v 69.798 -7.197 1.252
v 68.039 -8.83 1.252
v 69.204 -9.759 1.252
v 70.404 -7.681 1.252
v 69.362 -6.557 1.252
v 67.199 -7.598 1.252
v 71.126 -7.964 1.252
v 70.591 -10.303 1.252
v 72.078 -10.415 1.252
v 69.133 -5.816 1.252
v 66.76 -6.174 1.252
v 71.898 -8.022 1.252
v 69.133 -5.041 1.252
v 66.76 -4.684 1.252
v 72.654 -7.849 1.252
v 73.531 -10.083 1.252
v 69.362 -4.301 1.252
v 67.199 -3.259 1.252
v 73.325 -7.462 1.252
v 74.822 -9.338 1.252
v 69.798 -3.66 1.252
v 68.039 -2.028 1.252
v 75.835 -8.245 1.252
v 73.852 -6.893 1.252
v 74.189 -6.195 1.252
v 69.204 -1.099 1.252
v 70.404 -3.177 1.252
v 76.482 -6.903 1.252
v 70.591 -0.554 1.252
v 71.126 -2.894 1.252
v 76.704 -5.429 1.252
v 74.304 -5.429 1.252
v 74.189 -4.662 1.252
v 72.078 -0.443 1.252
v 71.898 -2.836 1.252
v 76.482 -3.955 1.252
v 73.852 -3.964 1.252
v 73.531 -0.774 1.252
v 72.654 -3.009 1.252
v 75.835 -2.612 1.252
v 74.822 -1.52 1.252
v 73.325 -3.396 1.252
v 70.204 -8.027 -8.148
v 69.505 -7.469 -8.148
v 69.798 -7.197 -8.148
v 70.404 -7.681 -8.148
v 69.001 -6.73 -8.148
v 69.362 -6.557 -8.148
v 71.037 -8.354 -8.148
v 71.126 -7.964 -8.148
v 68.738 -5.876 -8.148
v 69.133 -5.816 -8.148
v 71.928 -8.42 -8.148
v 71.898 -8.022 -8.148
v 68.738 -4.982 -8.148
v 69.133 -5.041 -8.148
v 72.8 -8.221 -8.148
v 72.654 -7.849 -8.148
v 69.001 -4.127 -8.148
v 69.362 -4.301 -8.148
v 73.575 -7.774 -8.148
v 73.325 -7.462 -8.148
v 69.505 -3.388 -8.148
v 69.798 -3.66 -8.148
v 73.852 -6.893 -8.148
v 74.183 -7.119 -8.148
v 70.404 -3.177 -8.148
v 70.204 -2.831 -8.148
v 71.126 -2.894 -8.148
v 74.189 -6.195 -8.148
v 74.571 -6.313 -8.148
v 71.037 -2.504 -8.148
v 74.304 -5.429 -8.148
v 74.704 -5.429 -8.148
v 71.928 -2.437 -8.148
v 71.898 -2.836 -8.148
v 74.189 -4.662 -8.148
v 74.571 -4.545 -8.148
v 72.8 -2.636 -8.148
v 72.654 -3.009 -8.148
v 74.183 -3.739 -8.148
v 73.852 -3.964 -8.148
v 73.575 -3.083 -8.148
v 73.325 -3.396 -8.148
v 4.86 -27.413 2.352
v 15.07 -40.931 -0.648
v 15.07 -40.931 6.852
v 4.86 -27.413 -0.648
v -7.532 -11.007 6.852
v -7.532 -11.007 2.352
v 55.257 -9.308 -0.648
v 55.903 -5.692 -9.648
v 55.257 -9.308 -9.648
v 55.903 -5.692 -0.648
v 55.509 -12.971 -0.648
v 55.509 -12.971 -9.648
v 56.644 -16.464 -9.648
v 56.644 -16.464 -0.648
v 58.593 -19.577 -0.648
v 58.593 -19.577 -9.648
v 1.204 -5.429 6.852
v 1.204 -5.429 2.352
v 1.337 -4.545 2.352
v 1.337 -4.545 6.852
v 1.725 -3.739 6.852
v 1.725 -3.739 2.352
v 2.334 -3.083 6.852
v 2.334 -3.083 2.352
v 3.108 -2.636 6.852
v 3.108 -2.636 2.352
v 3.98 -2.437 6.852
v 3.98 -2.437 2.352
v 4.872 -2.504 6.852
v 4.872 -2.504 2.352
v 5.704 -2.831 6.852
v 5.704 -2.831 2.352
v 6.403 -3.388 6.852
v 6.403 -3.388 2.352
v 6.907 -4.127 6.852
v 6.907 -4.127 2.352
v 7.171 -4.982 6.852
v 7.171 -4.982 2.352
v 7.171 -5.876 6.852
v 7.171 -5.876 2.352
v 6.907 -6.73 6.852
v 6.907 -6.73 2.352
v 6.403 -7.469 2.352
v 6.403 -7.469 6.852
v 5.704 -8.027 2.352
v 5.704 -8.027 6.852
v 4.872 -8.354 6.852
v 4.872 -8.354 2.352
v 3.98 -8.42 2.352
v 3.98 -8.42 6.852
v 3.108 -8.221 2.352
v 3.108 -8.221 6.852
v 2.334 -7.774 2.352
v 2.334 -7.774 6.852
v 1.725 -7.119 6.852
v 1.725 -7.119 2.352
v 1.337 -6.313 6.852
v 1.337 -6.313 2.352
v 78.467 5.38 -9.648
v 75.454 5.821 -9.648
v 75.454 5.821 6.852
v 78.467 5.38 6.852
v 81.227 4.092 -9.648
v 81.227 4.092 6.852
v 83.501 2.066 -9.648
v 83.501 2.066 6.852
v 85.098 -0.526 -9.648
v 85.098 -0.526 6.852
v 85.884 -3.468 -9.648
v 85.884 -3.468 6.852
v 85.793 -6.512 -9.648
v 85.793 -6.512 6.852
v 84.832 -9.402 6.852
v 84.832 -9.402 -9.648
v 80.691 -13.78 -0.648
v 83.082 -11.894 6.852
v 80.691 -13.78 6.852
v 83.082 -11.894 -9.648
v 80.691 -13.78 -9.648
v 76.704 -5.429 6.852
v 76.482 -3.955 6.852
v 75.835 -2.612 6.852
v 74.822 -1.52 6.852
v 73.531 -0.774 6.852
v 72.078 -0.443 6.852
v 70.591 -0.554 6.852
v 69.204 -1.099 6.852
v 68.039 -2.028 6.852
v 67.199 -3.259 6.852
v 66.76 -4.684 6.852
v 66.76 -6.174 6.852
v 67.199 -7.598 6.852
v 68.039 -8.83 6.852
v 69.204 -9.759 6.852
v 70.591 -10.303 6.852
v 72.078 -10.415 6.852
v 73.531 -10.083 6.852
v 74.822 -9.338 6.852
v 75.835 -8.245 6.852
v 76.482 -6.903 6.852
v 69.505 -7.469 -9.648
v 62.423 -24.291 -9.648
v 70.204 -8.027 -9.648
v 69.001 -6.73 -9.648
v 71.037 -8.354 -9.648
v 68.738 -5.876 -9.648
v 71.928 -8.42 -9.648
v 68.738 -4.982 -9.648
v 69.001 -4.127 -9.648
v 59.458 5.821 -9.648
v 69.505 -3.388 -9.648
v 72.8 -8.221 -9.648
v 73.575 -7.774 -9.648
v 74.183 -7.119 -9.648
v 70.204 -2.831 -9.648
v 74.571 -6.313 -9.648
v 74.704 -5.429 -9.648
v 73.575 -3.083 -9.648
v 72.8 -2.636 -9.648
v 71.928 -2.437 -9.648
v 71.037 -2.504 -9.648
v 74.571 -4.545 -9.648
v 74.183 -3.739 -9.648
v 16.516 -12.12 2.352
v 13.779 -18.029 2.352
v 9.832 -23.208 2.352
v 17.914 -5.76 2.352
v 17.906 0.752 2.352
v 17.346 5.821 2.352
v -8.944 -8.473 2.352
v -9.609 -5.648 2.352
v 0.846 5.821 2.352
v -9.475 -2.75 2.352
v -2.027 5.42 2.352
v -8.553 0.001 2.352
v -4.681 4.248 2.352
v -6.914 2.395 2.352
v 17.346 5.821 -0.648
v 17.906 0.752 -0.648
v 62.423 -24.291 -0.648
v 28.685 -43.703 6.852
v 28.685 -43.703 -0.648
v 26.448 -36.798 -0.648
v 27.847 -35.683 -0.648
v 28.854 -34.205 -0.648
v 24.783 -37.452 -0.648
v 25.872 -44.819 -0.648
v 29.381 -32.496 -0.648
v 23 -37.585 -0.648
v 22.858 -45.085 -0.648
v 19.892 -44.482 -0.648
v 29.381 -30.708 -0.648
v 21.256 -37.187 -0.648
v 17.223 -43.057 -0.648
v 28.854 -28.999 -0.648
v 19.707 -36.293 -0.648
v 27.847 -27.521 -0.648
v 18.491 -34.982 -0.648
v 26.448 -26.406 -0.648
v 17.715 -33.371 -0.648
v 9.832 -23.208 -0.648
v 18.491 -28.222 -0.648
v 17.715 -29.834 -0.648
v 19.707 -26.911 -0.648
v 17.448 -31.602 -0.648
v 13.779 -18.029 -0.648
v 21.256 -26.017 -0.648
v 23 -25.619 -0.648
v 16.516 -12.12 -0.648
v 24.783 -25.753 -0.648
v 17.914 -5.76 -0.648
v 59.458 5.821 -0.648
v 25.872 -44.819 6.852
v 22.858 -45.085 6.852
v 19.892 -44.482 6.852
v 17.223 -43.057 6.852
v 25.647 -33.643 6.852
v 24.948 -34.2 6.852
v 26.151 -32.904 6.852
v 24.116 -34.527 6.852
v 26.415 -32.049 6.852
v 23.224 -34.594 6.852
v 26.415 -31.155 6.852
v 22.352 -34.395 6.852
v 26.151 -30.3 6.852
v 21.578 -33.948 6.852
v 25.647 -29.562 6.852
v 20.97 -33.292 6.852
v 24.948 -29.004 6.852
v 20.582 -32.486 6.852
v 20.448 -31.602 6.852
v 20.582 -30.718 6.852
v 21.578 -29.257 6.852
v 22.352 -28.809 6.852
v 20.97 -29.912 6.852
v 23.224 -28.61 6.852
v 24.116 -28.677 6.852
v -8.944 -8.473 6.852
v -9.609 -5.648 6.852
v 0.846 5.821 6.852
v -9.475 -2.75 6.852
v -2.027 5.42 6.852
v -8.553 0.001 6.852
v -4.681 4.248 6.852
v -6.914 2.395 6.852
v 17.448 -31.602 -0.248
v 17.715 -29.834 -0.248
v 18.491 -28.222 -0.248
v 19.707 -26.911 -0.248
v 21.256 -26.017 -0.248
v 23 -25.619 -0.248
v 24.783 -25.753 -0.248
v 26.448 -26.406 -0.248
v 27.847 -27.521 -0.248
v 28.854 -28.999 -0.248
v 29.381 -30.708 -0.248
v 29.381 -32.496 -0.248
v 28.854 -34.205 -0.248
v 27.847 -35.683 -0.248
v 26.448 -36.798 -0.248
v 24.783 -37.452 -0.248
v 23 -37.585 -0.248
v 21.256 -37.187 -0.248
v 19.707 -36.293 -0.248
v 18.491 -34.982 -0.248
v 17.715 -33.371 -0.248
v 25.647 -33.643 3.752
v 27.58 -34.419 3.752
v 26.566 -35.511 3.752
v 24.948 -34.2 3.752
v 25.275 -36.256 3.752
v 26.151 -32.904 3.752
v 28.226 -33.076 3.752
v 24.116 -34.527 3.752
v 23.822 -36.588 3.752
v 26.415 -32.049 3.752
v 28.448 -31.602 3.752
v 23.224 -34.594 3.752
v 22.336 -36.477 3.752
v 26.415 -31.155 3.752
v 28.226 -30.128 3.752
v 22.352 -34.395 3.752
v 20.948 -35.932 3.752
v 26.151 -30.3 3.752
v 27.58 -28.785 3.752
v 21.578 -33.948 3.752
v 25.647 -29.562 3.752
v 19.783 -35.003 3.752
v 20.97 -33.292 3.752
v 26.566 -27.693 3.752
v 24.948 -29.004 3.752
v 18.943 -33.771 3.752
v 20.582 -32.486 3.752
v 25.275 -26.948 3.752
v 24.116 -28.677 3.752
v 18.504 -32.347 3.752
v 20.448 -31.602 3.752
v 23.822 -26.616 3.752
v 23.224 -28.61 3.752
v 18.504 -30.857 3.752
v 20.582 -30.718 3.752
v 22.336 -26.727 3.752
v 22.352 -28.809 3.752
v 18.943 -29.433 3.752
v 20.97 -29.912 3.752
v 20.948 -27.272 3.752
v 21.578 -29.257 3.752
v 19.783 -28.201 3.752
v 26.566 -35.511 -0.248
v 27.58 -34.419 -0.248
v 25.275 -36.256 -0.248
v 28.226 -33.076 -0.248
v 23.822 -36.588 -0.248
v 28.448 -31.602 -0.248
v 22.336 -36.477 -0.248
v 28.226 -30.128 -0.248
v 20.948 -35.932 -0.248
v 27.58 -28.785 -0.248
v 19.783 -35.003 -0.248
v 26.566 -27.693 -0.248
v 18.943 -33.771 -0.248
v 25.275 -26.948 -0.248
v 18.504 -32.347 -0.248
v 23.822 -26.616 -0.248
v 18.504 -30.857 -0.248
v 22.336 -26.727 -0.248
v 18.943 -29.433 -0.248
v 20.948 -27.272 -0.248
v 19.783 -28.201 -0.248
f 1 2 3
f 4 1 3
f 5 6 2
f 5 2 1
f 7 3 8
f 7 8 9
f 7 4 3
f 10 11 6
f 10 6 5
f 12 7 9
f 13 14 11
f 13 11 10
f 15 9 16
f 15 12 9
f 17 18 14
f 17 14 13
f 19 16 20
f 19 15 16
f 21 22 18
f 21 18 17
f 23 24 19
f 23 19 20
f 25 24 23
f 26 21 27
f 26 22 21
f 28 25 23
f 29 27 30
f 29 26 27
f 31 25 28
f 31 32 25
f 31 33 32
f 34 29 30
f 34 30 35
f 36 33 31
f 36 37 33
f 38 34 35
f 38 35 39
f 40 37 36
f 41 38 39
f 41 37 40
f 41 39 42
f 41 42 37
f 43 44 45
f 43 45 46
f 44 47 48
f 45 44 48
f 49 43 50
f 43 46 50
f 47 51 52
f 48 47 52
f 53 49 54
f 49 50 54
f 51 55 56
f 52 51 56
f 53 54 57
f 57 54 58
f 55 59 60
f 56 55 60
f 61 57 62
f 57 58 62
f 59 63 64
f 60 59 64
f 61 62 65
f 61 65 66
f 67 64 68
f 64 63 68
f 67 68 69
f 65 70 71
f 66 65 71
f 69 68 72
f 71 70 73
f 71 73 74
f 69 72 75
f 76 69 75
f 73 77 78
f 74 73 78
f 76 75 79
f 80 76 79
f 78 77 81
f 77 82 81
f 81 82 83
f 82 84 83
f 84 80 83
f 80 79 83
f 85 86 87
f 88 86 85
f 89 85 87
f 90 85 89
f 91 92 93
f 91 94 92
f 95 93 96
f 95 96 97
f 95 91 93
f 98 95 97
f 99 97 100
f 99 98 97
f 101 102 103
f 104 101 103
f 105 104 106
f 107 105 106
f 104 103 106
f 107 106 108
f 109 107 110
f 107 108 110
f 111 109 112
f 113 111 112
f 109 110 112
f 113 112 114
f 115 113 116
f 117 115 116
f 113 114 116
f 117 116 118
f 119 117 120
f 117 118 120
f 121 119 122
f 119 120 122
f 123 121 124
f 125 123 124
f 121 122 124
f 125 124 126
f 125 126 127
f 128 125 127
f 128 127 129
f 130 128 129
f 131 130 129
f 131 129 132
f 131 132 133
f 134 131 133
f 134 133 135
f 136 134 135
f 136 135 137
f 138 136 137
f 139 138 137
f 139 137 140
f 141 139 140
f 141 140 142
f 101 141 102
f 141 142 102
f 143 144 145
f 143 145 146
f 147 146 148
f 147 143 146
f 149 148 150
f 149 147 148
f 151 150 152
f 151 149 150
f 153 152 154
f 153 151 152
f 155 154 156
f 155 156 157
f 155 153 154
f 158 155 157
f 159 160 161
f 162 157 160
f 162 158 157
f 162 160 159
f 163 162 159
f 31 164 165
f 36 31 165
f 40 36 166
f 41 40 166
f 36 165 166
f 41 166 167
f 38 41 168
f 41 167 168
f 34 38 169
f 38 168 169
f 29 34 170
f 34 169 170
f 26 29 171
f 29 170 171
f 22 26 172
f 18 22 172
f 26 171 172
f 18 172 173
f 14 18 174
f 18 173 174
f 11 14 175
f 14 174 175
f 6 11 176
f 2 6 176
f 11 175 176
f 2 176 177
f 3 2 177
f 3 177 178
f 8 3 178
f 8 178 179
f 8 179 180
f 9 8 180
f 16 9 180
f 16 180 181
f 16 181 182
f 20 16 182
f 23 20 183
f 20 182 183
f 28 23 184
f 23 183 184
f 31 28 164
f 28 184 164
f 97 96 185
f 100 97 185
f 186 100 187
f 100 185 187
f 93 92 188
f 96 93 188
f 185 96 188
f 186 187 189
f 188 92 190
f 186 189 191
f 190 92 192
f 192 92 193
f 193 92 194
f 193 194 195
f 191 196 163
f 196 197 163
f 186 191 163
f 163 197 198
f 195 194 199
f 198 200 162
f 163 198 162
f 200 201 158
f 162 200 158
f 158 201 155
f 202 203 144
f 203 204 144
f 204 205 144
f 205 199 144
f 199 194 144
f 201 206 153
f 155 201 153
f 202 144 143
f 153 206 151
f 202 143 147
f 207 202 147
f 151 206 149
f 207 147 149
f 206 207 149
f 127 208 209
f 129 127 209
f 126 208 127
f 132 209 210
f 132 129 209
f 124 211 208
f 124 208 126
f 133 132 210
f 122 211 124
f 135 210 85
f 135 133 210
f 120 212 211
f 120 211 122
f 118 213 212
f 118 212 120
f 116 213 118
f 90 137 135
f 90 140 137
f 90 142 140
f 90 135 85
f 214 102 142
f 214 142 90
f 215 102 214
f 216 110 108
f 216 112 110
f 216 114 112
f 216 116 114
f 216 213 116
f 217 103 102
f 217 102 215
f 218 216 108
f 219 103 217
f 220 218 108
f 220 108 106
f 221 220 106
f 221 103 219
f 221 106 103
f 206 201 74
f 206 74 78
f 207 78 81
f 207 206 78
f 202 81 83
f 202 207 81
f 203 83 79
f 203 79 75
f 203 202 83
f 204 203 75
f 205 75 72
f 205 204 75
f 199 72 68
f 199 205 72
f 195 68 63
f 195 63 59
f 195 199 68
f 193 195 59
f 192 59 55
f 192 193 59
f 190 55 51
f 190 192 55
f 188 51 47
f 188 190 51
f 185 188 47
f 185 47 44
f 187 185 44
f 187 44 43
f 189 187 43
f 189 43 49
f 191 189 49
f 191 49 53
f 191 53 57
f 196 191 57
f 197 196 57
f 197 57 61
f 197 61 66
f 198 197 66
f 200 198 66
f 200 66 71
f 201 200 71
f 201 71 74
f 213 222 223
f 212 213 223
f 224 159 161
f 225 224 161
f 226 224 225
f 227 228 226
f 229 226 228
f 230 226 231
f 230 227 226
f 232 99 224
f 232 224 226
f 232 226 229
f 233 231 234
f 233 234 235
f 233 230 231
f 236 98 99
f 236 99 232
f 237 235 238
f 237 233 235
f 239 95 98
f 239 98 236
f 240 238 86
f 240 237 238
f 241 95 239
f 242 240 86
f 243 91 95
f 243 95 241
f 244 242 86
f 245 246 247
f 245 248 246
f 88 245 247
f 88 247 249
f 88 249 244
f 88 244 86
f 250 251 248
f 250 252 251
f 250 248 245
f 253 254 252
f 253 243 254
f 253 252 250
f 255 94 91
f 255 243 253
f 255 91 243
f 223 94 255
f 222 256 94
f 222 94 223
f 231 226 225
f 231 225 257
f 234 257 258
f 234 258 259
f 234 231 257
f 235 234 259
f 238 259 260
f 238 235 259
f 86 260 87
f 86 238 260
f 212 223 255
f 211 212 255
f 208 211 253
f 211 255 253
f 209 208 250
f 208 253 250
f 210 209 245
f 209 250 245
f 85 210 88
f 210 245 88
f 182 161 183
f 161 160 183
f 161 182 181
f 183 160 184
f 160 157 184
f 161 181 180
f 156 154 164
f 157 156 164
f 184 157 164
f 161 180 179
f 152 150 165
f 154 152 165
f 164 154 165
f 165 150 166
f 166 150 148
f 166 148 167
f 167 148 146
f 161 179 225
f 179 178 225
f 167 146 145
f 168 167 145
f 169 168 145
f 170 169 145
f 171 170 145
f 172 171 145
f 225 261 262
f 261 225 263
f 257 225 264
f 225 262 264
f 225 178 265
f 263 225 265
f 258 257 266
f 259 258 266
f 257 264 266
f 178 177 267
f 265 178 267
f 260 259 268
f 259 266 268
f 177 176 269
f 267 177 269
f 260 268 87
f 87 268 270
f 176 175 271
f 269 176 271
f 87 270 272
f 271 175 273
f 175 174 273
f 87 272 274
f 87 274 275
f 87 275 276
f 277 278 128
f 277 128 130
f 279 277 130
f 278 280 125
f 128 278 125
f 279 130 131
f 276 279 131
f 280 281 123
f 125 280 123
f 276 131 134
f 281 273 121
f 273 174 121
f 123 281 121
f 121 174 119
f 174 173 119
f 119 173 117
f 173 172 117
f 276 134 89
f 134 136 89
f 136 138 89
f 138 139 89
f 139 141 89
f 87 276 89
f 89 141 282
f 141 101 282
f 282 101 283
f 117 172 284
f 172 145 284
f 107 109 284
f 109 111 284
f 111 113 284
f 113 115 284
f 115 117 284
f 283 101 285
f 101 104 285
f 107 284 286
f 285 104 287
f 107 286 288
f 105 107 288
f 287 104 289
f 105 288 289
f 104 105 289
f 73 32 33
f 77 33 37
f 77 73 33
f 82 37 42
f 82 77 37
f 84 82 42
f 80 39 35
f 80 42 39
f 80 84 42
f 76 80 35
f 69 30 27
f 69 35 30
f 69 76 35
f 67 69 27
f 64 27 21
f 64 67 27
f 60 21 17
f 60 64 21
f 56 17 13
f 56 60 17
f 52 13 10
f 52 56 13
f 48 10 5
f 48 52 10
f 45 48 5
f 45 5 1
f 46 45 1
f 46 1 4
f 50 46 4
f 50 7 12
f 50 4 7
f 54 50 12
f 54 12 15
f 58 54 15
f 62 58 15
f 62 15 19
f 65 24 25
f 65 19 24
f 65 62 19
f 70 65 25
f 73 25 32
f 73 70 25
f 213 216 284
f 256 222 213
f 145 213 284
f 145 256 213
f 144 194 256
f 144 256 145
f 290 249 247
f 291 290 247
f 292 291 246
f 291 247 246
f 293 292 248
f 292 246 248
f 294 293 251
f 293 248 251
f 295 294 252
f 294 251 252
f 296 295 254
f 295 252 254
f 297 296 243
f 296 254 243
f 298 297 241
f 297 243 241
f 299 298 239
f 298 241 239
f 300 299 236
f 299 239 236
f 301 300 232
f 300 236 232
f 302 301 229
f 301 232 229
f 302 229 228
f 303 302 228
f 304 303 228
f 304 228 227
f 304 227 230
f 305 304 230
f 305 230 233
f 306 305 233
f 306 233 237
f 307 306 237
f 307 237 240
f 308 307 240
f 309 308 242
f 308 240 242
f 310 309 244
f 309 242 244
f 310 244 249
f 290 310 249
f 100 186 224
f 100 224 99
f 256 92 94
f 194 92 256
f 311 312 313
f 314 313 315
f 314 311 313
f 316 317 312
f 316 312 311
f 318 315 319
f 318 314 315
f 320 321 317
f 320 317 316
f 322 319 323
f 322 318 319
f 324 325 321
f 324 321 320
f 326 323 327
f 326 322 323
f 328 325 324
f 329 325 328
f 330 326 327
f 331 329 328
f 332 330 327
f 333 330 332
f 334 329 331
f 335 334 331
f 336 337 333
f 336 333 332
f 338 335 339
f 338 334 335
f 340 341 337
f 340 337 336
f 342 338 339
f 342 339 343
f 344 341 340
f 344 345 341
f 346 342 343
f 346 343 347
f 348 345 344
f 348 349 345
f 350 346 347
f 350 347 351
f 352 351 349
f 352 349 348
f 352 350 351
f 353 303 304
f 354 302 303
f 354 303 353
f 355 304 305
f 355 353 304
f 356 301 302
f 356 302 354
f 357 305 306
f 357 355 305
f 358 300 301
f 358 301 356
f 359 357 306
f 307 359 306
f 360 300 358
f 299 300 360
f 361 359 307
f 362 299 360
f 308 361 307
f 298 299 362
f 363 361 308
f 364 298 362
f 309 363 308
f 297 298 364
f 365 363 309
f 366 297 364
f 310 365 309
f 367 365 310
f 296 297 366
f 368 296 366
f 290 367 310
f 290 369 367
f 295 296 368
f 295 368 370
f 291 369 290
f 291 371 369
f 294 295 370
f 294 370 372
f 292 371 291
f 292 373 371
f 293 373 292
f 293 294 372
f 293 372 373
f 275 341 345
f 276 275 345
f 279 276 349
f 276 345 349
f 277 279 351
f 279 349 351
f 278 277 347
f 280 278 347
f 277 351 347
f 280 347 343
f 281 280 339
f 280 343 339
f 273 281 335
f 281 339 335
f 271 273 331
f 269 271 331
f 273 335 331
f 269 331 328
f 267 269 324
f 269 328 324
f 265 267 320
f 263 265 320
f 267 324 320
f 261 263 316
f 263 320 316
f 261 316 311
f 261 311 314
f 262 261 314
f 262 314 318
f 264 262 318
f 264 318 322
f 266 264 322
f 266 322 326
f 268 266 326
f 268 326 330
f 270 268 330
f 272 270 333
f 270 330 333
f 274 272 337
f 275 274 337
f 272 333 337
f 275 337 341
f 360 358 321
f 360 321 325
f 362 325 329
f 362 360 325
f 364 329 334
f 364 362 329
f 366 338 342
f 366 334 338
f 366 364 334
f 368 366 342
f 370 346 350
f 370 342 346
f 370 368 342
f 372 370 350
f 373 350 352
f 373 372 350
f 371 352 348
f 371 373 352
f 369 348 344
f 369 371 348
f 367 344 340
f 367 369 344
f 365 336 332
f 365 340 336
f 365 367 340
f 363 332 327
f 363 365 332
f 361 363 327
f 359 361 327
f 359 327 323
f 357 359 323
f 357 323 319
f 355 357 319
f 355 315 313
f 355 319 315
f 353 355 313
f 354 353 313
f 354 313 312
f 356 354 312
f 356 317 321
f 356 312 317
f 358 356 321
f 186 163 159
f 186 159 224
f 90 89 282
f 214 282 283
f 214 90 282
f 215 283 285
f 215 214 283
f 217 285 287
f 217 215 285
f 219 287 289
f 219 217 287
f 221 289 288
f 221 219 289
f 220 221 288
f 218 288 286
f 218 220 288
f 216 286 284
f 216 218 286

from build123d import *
from build123d.topology import SkipClean

# Parameters (mm, degrees)
SKETCH_1_R          = 3.333333333
SKETCH_1_R_2        = 5
EXTRUDE_1_DEPTH     = 5
EXTRUDE_START       = 6
SKETCH_6_R          = 5
EXTRUDE_5_DEPTH     = 6
EXTRUDE_START_2     = 2
SKETCH_7_R          = 2
EXTRUDE_6_DEPTH     = 2
SKETCH_9_R          = 2
CUT_EXTRUDE_3_DEPTH = 79.745912397
EXTRUDE_START_3     = -11
SKETCH_10_R         = 5
SKETCH_10_R_2       = 2
EXTRUDE_7_DEPTH     = 11
FILLET_2_R          = 10
SCALE_1_SCALE       = 1.5
SKETCH_11_R         = 3
CUT_EXTRUDE_4_DEPTH = 6
EXTRUDE_START_4     = -15
SKETCH_12_R         = 3
SKETCH_12_R_2       = 2.6
EXTRUDE_8_DEPTH     = 15
SKETCH_13_R         = 5
CUT_EXTRUDE_5_DEPTH = 5.6
EXTRUDE_START_5     = -4.4
SKETCH_15_R         = 5
SKETCH_15_R_2       = 3
EXTRUDE_9_DEPTH     = 3.1
SKETCH_16_R         = 6
CUT_EXTRUDE_6_DEPTH = 0.4


with BuildPart() as part:
    # 草图1 → 凸台-拉伸1 (new body)
    with BuildSketch(Plane.XY):
        with BuildLine():
            Line((14.059772875, 0), (63.798276921, 0))
            ThreePointArc((63.798276921, 0), (70.56109353, -5.193259423), (67.289321258, -13.067339568))
            Line((67.289321258, -13.067339568), (32.61880944, -33.016164352))
            ThreePointArc((32.61880944, -33.016164352), (27.731011729, -33.808057978), (23.542094163, -31.167862607))
            Line((23.542094163, -31.167862607), (8.474101936, -11.219037824))
            ThreePointArc((8.474101936, -11.219037824), (7.793463564, -3.88016545), (14.059772875, 0))
        make_face()
        with Locations((29.127765103, -24.948824784)):
            Circle(SKETCH_1_R, mode=Mode.SUBTRACT)
        with Locations((61.298276921, -7.5)):
            Circle(SKETCH_1_R_2, mode=Mode.SUBTRACT)
    extrude(amount=EXTRUDE_1_DEPTH)

    # 草图6 → 凸台-拉伸5 (add)
    with SkipClean():  # the faces are left unmerged after this step: merging them gives an invalid solid
        with BuildSketch(Plane(origin=(0, 0, 0), x_dir=(-1, 0, 0), z_dir=(0, 0, -1)).offset(EXTRUDE_START)):
            with BuildLine():
                Line((-67.289321258, -13.067339568), (-55.111154239, -20.074450433))
                Line((-55.111154239, -20.074450433), (-49.187018483, -12.783115053))
                Line((-49.187018483, -12.783115053), (-53.134085027, 0))
                Line((-53.134085027, 0), (-63.798276921, 0))
                ThreePointArc((-63.798276921, 0), (-70.56109353, -5.193259423), (-67.289321258, -13.067339568))
            make_face()
            with Locations((-61.298276921, -7.5)):
                Circle(SKETCH_6_R, mode=Mode.SUBTRACT)
        extrude(amount=-EXTRUDE_5_DEPTH)

    # 草图7 → 凸台-拉伸6 (add)
    with SkipClean():  # the faces are left unmerged after this step: merging them gives an invalid solid
        with BuildSketch(Plane(origin=(0, 0, 0), x_dir=(-1, 0, 0), z_dir=(0, 0, -1)).offset(EXTRUDE_START_2)):
            with BuildLine():
                Line((-14.059772875, 0), (-25.059772875, 0))
                Line((-25.059772875, 0), (-26.163863889, -10))
                Line((-26.163863889, -10), (-13.040056703, -17.263999238))
                Line((-13.040056703, -17.263999238), (-8.474101936, -11.219037824))
                ThreePointArc((-8.474101936, -11.219037824), (-7.793463564, -3.88016545), (-14.059772875, 0))
            make_face()
            with Locations((-16.298276921, -7.5)):
                Circle(SKETCH_7_R, mode=Mode.SUBTRACT)
        extrude(amount=-EXTRUDE_6_DEPTH)

    # 草图9 → 切除-拉伸3 (cut, through all)
    with SkipClean():  # the faces are left unmerged after this step: merging them gives an invalid solid
        with BuildSketch(Plane(origin=(0, 0, 0), x_dir=(-1, 0, 0), z_dir=(0, 0, -1))):
            with Locations((-16.298276921, -7.5)):
                Circle(SKETCH_9_R)
        extrude(amount=-CUT_EXTRUDE_3_DEPTH, mode=Mode.SUBTRACT)

    # 草图10 → 凸台-拉伸7 (add)
    with BuildSketch(Plane.XY.offset(5).offset(EXTRUDE_START_3)):
        with Locations((61.298276921, -7.5)):
            Circle(SKETCH_10_R)
        with Locations((61.298276921, -7.5)):
            Circle(SKETCH_10_R_2, mode=Mode.SUBTRACT)
    extrude(amount=EXTRUDE_7_DEPTH)

    # 圆角2
    fillet_2_edges = [part.edges().sort_by_distance(p)[0] for p in [
        (49.187018483, -12.783115053, -3),
        (26.163863889, -10, -1),
    ]]
    fillet(fillet_2_edges, radius=FILLET_2_R)


with BuildPart() as part_1:
    # 缩放比例1: scaled about (40.486651363, -11.642315259, 1.295457426)
    add(part.part.scale(SCALE_1_SCALE).moved(Location((-20.243325682, 5.82115763, -0.647728713))))

    # 草图11 → 切除-拉伸4 (cut)
    with BuildSketch(Plane(origin=(0, 0, -3.647728713), x_dir=(-1, 0, 0), z_dir=(0, 0, -1))):
        with BuildLine():
            Line((-17.346333632, 5.82115763), (-17.905962845, 0.752470301))
            ThreePointArc((-17.905962845, 0.752470301), (-15.308702596, -15.14882708), (-4.859629901, -27.41316151))
            Line((-4.859629901, -27.41316151), (7.532172777, -11.007399106))
            ThreePointArc((7.532172777, -11.007399106), (8.553130335, 0.000909454), (-0.846333632, 5.82115763))
            Line((-0.846333632, 5.82115763), (-17.346333632, 5.82115763))
        make_face()
        with Locations((-4.2040897, -5.42884237)):
            Circle(SKETCH_11_R, mode=Mode.SUBTRACT)
    extrude(amount=-CUT_EXTRUDE_4_DEPTH, mode=Mode.SUBTRACT)

    # 草图12 → 凸台-拉伸8 (add)
    with BuildSketch(Plane.XY.offset(6.852271287).offset(EXTRUDE_START_4)):
        with Locations((71.7040897, -5.42884237)):
            Circle(SKETCH_12_R)
        with Locations((71.7040897, -5.42884237)):
            Circle(SKETCH_12_R_2, mode=Mode.SUBTRACT)
    extrude(amount=EXTRUDE_8_DEPTH)

    # 草图13 → 切除-拉伸5 (cut)
    with BuildSketch(Plane.XY.offset(6.852271287)):
        with Locations((71.7040897, -5.42884237)):
            Circle(SKETCH_13_R)
    extrude(amount=-CUT_EXTRUDE_5_DEPTH, mode=Mode.SUBTRACT)

    # 草图15 → 凸台-拉伸9 (add)
    with BuildSketch(Plane(origin=(0, 0, -0.647728713), x_dir=(-1, 0, 0), z_dir=(0, 0, -1)).offset(EXTRUDE_START_5)):
        with Locations((-23.448321972, -31.602079546)):
            Circle(SKETCH_15_R)
        with Locations((-23.448321972, -31.602079546)):
            Circle(SKETCH_15_R_2, mode=Mode.SUBTRACT)
    extrude(amount=-EXTRUDE_9_DEPTH)

    # 草图16 → 切除-拉伸6 (cut)
    with BuildSketch(Plane(origin=(0, 0, -0.647728713), x_dir=(-1, 0, 0), z_dir=(0, 0, -1))):
        with Locations((-23.448321972, -31.602079546)):
            Circle(SKETCH_16_R)
    extrude(amount=-CUT_EXTRUDE_6_DEPTH, mode=Mode.SUBTRACT)


solid = part_1.part
